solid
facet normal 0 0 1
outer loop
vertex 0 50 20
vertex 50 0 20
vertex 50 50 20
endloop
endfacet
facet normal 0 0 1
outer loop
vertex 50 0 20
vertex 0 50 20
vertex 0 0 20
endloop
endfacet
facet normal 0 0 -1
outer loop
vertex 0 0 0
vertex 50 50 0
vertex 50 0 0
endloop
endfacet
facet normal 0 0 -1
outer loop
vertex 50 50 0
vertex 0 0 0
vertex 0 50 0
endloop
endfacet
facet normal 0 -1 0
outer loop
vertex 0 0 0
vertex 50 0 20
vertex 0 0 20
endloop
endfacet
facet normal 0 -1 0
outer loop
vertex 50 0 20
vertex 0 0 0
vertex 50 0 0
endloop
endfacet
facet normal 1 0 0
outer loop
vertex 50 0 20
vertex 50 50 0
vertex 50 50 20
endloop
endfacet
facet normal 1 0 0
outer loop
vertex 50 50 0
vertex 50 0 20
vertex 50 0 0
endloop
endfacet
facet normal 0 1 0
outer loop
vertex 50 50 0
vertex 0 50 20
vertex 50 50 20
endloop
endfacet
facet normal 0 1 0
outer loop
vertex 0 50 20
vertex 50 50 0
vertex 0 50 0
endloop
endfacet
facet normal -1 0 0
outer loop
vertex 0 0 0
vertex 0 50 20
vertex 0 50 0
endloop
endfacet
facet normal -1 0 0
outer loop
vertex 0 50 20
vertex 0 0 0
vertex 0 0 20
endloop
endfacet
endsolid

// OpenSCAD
// Project: [Project Name]
// Description: [Brief description of what this design does]
// Author: [Your name]
// Date: [Date created]
// Version: 1.0

// ===== PARAMETERS =====
// Adjust these values to customize the design

// Main dimensions (in mm)
width = 50;
length = 50;
height = 20;

// Wall thickness
wall_thickness = 2;

// Quality settings
$fn = 100;  // Fragment number for circles (higher = smoother but slower)

// ===== MODULES =====
// Define reusable components here

module main_body() {
    cube([width, length, height]);
}

// ===== MAIN DESIGN =====
// Put your main design code here

main_body();

// ===== ASSEMBLY =====
// If you have multiple parts, you can arrange them for printing or assembly view

// Example:
// translate([width + 10, 0, 0])
//     part_2();
